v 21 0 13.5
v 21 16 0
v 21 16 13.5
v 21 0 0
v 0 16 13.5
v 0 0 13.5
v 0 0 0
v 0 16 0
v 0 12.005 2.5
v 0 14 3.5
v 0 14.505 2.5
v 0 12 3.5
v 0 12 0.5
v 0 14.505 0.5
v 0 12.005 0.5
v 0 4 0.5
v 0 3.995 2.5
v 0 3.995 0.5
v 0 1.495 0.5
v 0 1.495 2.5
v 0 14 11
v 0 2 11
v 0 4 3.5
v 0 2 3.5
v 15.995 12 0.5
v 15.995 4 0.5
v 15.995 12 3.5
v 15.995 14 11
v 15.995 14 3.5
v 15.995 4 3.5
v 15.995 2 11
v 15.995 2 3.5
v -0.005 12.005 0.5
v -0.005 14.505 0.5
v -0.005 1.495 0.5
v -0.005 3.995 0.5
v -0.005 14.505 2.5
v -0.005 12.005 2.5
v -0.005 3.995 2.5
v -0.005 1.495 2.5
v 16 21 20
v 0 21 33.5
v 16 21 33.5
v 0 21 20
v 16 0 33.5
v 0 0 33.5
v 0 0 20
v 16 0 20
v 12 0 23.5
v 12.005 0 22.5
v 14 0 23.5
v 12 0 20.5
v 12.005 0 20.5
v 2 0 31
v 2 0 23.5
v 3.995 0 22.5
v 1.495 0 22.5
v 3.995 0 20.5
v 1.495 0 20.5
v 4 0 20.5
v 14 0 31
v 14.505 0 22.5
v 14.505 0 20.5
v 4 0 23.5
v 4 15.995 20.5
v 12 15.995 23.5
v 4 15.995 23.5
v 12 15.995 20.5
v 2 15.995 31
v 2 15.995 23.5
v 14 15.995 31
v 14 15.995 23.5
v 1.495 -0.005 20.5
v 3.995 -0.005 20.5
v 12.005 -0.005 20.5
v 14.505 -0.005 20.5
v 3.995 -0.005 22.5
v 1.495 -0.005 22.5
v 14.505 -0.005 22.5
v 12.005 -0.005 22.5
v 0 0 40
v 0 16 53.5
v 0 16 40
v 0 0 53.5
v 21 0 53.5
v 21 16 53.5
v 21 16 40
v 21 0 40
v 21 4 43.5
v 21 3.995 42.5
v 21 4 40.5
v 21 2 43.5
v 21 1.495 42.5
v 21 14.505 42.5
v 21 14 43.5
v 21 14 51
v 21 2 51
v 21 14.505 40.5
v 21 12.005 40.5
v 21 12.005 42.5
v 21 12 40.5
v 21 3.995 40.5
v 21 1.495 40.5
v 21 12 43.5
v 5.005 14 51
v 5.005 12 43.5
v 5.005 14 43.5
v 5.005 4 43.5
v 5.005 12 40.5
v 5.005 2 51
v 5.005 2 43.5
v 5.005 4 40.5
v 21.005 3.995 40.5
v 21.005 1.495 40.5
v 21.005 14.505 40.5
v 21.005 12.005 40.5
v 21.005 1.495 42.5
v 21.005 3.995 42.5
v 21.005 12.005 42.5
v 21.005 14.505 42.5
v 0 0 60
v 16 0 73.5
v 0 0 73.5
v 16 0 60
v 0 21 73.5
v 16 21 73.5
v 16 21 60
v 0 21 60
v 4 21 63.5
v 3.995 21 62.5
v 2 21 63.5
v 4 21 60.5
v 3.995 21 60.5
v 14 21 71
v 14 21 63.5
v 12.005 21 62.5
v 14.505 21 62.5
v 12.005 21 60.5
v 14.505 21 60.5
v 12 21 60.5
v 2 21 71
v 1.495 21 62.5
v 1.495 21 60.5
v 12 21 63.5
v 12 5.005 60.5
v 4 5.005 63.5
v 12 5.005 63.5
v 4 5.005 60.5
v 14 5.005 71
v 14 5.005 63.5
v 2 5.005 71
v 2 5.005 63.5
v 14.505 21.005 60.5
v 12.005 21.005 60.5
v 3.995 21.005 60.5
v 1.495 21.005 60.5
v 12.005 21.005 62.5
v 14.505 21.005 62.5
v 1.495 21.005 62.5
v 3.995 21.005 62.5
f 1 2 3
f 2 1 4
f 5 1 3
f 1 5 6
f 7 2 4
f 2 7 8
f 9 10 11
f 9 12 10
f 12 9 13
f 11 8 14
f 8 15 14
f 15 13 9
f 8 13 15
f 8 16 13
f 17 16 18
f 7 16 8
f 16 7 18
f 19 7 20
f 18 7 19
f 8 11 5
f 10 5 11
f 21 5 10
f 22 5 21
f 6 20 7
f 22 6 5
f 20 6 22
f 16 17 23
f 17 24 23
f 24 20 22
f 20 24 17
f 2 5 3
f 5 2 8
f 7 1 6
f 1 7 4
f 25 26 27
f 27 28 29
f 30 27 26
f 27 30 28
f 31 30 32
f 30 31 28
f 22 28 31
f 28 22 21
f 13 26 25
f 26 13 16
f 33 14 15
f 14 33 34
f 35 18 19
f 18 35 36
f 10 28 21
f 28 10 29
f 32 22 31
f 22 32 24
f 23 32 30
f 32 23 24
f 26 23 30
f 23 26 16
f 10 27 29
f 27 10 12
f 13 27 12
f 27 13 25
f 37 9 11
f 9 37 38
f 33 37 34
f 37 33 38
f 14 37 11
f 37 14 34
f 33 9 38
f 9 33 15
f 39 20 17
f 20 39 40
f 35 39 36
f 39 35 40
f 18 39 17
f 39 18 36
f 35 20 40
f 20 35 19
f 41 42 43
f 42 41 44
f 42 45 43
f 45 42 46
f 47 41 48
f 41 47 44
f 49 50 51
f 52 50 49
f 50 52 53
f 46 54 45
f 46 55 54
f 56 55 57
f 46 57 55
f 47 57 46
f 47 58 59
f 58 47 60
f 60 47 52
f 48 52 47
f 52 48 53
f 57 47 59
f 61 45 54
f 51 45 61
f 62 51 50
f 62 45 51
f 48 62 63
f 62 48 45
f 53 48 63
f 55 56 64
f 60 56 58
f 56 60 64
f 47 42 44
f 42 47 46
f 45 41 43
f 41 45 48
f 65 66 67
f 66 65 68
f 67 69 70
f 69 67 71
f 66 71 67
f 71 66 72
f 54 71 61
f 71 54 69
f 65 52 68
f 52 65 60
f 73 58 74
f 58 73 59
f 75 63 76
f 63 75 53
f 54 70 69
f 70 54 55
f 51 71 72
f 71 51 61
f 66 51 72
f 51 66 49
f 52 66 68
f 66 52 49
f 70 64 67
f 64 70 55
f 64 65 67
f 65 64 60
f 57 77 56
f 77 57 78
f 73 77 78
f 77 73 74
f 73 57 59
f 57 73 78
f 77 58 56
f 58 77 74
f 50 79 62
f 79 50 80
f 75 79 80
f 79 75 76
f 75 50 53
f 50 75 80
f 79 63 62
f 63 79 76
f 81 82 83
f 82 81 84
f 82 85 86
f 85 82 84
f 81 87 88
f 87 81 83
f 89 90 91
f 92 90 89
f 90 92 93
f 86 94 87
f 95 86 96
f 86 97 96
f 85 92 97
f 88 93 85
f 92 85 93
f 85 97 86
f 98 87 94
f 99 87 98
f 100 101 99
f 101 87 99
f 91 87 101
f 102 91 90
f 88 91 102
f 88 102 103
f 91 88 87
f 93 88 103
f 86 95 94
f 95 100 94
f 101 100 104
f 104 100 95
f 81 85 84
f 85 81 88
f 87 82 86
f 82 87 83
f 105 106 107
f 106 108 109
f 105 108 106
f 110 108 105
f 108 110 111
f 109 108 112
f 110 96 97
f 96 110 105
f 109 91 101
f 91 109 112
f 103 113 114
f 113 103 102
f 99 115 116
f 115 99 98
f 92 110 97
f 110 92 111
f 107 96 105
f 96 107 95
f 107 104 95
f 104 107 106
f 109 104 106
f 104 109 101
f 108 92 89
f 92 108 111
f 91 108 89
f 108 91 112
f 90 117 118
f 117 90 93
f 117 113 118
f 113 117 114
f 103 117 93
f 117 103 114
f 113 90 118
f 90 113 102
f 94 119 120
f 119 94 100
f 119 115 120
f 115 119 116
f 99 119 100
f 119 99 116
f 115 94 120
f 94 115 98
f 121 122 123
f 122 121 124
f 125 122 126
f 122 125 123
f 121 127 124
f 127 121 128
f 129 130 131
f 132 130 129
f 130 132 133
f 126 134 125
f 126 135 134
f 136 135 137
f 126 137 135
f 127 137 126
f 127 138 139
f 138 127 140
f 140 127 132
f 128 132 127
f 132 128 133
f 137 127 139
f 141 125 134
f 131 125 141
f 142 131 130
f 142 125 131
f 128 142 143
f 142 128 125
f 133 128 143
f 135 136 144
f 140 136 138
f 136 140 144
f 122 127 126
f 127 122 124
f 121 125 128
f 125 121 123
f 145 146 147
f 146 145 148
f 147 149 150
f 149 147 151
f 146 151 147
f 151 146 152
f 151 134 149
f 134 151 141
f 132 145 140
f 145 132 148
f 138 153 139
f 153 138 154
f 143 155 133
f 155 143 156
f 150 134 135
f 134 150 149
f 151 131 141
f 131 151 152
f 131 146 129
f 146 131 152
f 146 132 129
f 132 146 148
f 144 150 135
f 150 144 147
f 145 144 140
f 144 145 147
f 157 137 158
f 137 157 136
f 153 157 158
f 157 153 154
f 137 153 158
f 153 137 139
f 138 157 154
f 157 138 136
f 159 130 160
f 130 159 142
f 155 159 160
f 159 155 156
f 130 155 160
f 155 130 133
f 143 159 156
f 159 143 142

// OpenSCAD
// Copyright (c) 2017 Clément Bœsch <u pkh.me>
//
// Permission to use, copy, modify, and distribute this software for any
// purpose with or without fee is hereby granted, provided that the above
// copyright notice and this permission notice appear in all copies.
//
// THE SOFTWARE IS PROVIDED "AS IS" AND THE AUTHOR DISCLAIMS ALL WARRANTIES
// WITH REGARD TO THIS SOFTWARE INCLUDING ALL IMPLIED WARRANTIES OF
// MERCHANTABILITY AND FITNESS. IN NO EVENT SHALL THE AUTHOR BE LIABLE FOR
// ANY SPECIAL, DIRECT, INDIRECT, OR CONSEQUENTIAL DAMAGES OR ANY DAMAGES
// WHATSOEVER RESULTING FROM LOSS OF USE, DATA OR PROFITS, WHETHER IN AN
// ACTION OF CONTRACT, NEGLIGENCE OR OTHER TORTIOUS ACTION, ARISING OUT OF
// OR IN CONNECTION WITH THE USE OR PERFORMANCE OF THIS SOFTWARE.

$fn = 30;

_delta = 0.005;
_c_metal = [.7, .7, .7];
_c_black = [.3, .3, .3];

module _set_flipped(dim, flipped) {
    if (flipped) {
        translate([0, dim[1], dim[2]])
            rotate([180, 0, 0])
                children();
    } else {
        children();
    }
}

module _set_direction(dim, direction) {
    if (direction == "N")
        translate([0, dim[0], 0])
            rotate([0, 0, -90])
                children();
    else if (direction == "S")
        translate([dim[1], 0, 0])
            rotate([0, 0, 90])
                children();
    else if (direction == "E")
        translate([dim[0], dim[1], 0])
            rotate([0, 0, 180])
                children();
    else if (direction == "W")
        children();
}

module _set_orient(dim, direction, flipped) {
    //%cube(dim);
    _set_direction(dim, direction)
        _set_flipped(dim, flipped)
            children();
}

module set_obj(pos=[0,0,0], dim=[0,0,0], direction="W", flipped=false) {
    translate(pos)
        _set_orient(dim, direction, flipped)
            children();
}

module _ethernet(dim, swap_led) {
    l = dim[0];
    w = dim[1];
    h = dim[2];

    c_green  = [.3, .9, .3];
    c_yellow = [.9, .9, .3];
    c1 = swap_led ? c_yellow : c_green;
    c2 = swap_led ? c_green  : c_yellow;

    difference() {
        color(_c_metal)
            cube(dim);
        translate([-_delta, 2, 0.5])
            color(_c_black)
                cube([l-5, w-4, h-3]);
    }

    color(_c_black)
        for (y = [2, w-4])
            translate([0, y, 0.5])
                cube([l-1, 2, 3]);

    color(c1)
        translate([-_delta, w-4+_delta, .5])
            cube([1, 2.5, 2]);

    color(c2)
        translate([-_delta, 1.5-_delta, .5])
            cube([1, 2.5, 2]);
}

module _usb(dim, n=1, clr="white") {
    pin_l = .6;
    l = dim[0] - pin_l;
    w = dim[1] - pin_l*2;
    h = dim[2] - pin_l*2;

    t = 0.25;
    p = 0.75;
    z = pin_l * sqrt(2);

    translate([pin_l, pin_l, pin_l]) {
        color(_c_metal) {
            difference() {
                cube([l, w, h]);
                translate([-_delta, t, t])
                    cube([l-t+_delta, w-t*2, h-t*2]);
            }
            translate([0,   p, h-t]) rotate(a= 45, v=[0,1,0]) translate([-z,  0,  0]) cube([z, w - 2*p,       t]);
            translate([0,   p,   t]) rotate(a=-45, v=[0,1,0]) translate([-z,  0, -t]) cube([z, w - 2*p,       t]);
            translate([0,   t,   p]) rotate(a= 45, v=[0,0,1]) translate([-z, -t,  0]) cube([z,       t, h - 2*p]);
            translate([0, w-t,   p]) rotate(a=-45, v=[0,0,1]) translate([-z,  0,  0]) cube([z,       t, h - 2*p]);
        }
        color(clr)
            for (y = [0:n-1])
                translate([0, 1, h-(3.5+9*y)]) // XXX: random shit
                    cube([l-t, w-2, 2]);
    }
    color(_c_metal)
        translate([pin_l+l-l/3, pin_l])
            cube([l/3, w, pin_l]);
}

module _usbx2(dim) {
    _usb(dim, n=2, clr=_c_black);

    // separator (XXX: random shit)
    pin_l = .6;
    t = 0.25;
    l = dim[0] - pin_l - t;
    w = dim[1] - pin_l*2 - t*2;
    color(_c_metal)
        translate([0, (dim[1]-w)/2, (dim[2]-3.5)/2])
            cube([l, w, 3.5]);
}

module _pins_pos(dim, n, m, pins_dist) { // centered position for the pins
    l = dim[0];
    w = dim[1];
    pl = (n - 1) * pins_dist;
    pw = (m - 1) * pins_dist;
    if (l <= pl) echo("WARN: female header length looks too small");
    if (w <= pw) echo("WARN: female header width looks too small");
    translate([(l-pl)/2, (w-pw)/2])
        for (y = [0:m-1])
            for (x = [0:n-1])
                translate([x * pins_dist, y * pins_dist])
                    children();
}

module _female_header(dim, n, m, pins_sz, pins_dist) {
    h = dim[2];
    color(_c_black) {
        difference() {
            cube(dim);
            translate([0, 0, _delta])
                linear_extrude(height=h-.25)
                    _pins_pos(dim, n, m, pins_dist)
                        square(pins_sz, center=true);
            translate([0, 0, h-.25])
                _pins_pos(dim, n, m, pins_dist)
                    rotate(45)
                        cylinder(d1=pins_sz*sqrt(2), d2=1.25+pins_sz, h=.25+_delta, $fn=4);
        }
    }
}

module _pins_slot(n, u) {
    x = u/4;
    z = u/2;
    h = u*n;
    slot_polygons = [
        [-z/2, h/2], [ z/2, h/2], [ u/2, h/2-x], [ u/2,-h/2+x],
        [ z/2,-h/2], [-z/2,-h/2], [-u/2,-h/2+x], [-u/2, h/2-x],
    ];
    polygon(slot_polygons);
}

module _pin_header(dim, n, m, pins_sz, pins_dist) {
    l = dim[0];
    w = dim[1];
    h = dim[2];
    color(_c_metal)
        linear_extrude(height=h)
            _pins_pos(dim, n, m, pins_dist)
                square(pins_sz, center=true);
    pl = (n - 1) * pins_dist;
    color(_c_black)
        linear_extrude(height=h/4)
            translate([(l-pl)/2, w/2])
                for (x = [0:n-1])
                    translate([x * pins_dist, 0])
                        _pins_slot(m, pins_dist);
}

_default_ethernet_dim = [21, 16, 13.5];
_default_usb_dim      = [14, 14.5, 8];
_default_usbx2_dim    = [17.5, 14.5, 16];
_default_hdmi_dim     = [11.5, 15, 6];
_default_microusb_dim = [6, 8, 3];
_default_jack_dim     = [12+2, 6.5, 5];
_default_serialcon_dim= [2.5, 22, 5.5];

module _hdmi(dim) {
    l = dim[0];
    w = dim[1];
    h = dim[2];
    lowest = h - 5.25;
    hdmi_polygon_pos = [[0, h], [w, h], [w, h-3.25],
                        [w-2, lowest], [2, lowest], [0, h-3.25]];
    color(_c_metal) {
        translate([7, 0, 0])
            cube([l-7, w, h]);
        rotate([90, 0, 90]) {
            linear_extrude(height=7) {
                difference() {
                    polygon(hdmi_polygon_pos);
                    offset(r=-.5)
                        polygon(hdmi_polygon_pos);
                }
            }
        }
    }
    color(_c_black)
        translate([2, 2, 3])
            cube([7, w-2*2, 1]);
}

module _microusb(dim) {
    l = dim[0];
    w = dim[1];
    h = dim[2];
    microusb_polygon_pos = [[1, h], [w-1, h], [w, h-1],
                            [w-2, 0], [2, 0], [0, h-1]];
    color(_c_metal) {
        translate([l-1, 0])
            cube([1, w, h]);
        rotate([90, 0, 90]) {
            linear_extrude(height=l-1) {
                difference() {
                    polygon(microusb_polygon_pos);
                    offset(r=-.5)
                        polygon(microusb_polygon_pos);
                }
            }
        }
    }
    color(_c_black)
        translate([1.5, (w-4)/2, h-1.5])
            cube([l-2.5, 4, .5]);
}

module _jack(dim) {
    l = dim[0];
    w = dim[1];
    h = dim[2];

    lcyl = 2;
    color(_c_black) {
        difference() {
            union() {
                translate([lcyl, 0, 0])
                    cube([l-lcyl, w, h]);
                translate([0, w/2, h/2])
                    rotate([90, 0, 90])
                        cylinder(d=h, h=lcyl);
            }
            translate([-_delta/2, w/2, h/2])
                rotate([90, 0, 90])
                    cylinder(d=3.5, h=l+_delta);
        }
    }
}

module _serialcon(dim) {
    l = dim[0];
    w = dim[1];
    h = dim[2];
    color([.9,.85,.75]) {
        translate([0, 1])
            cube([.5+_delta, w-2, h-1.5]);
        translate([l-.5, 1])
            cube([.5, w-2, h-1.5]);
        translate([_delta, 3, h-1.5])
            cube([0.5, w-3*2, 1.5-_delta]);
    }
    color(_c_black) {
        difference() {
            union() {
                translate([.5, 0.5, 0])
                    cube([l-1, w-1, h-1.5+_delta]);
                translate([0, 0, h-1.5])
                    cube([l, w, 1.5]);
            }
            translate([-_delta, 3, _delta])
                cube([l-1+_delta, w-3*2, h]);
        }
    }
}

module ethernet(dim=_default_ethernet_dim, swap_led=false, direction="W", flipped=false) {
    _set_orient(dim, direction, flipped)
        _ethernet(dim, swap_led);
}

module usb(dim=_default_usb_dim, direction="W", flipped=false) {
    _set_orient(dim, direction, flipped)
        _usb(dim);
}

module usbx2(dim=_default_usbx2_dim, direction="W", flipped=false) {
    _set_orient(dim, direction, flipped)
        _usbx2(dim);
}

module hdmi(dim=_default_hdmi_dim, direction="W", flipped=false) {
    _set_orient(dim, direction, flipped)
        _hdmi(dim);
}

module microusb(dim=_default_microusb_dim, direction="W", flipped=false) {
    _set_orient(dim, direction, flipped)
        _microusb(dim);
}

module jack(dim=_default_jack_dim, direction="W", flipped=false) {
    _set_orient(dim, direction, flipped)
        _jack(dim);
}

module serialcon(dim=_default_serialcon_dim, direction="W", flipped=false) {
    _set_orient(dim, direction, flipped)
        _serialcon(dim);
}

function _dim254(dim, n, m) = [
        dim[0] ? dim[0] : n*2.54,
        dim[1] ? dim[1] : m*2.5,
        dim[2] ? dim[2] : 8.5,
];

function _dim200(dim, n, m) = [
        dim[0] ? dim[0] : n*2,
        dim[1] ? dim[1] : m*2,
        dim[2] ? dim[2] : 4.5,
];

module female_header_pitch254(n, m, dim=[0,0,0], direction="W", flipped=false) {
    dim = _dim254(dim, n, m);
    _set_orient(dim, direction, flipped)
        _female_header(dim, n, m, pins_sz=.64, pins_dist=2.54);
}

module female_header_pitch200(n, m, dim=[0,0,0], direction="W", flipped=false) {
    dim = _dim200(dim, n, m);
    _set_orient(dim, direction, flipped)
        _female_header(dim, n, m, pins_sz=.50, pins_dist=2);
}

module pin_header_pitch254(n, m, dim=[0,0,0], direction="W", flipped=false) {
    dim = _dim254(dim, n, m);
    _set_orient(dim, direction, flipped)
        _pin_header(dim, n, m, pins_sz=.64, pins_dist=2.54);
}

module pin_header_pitch200(n, m, dim=[0,0,0], direction="W", flipped=false) {
    dim = _dim200(dim, n, m);
    _set_orient(dim, direction, flipped)
        _pin_header(dim, n, m, pins_sz=.50, pins_dist=2);
}

module _test_orient(dim, flipped, pad=20) {
    translate([0, 0, 0*pad]) _set_orient(dim, "W", flipped) children();
    translate([0, 0, 1*pad]) _set_orient(dim, "S", flipped) children();
    translate([0, 0, 2*pad]) _set_orient(dim, "E", flipped) children();
    translate([0, 0, 3*pad]) _set_orient(dim, "N", flipped) children();
}

_test_orient(_default_ethernet_dim, flipped=false)    ethernet();
//_test_orient(_default_usb_dim,      flipped=false)    usb();
//_test_orient(_default_usbx2_dim,    flipped=false)    usbx2();
//_test_orient(_default_hdmi_dim,     flipped=false)    hdmi();
//_test_orient(_default_microusb_dim, flipped=false)    microusb();
//_test_orient(_default_jack_dim,     flipped=false)    jack();
//_test_orient(_default_serialcon_dim,flipped=false)    serialcon();
